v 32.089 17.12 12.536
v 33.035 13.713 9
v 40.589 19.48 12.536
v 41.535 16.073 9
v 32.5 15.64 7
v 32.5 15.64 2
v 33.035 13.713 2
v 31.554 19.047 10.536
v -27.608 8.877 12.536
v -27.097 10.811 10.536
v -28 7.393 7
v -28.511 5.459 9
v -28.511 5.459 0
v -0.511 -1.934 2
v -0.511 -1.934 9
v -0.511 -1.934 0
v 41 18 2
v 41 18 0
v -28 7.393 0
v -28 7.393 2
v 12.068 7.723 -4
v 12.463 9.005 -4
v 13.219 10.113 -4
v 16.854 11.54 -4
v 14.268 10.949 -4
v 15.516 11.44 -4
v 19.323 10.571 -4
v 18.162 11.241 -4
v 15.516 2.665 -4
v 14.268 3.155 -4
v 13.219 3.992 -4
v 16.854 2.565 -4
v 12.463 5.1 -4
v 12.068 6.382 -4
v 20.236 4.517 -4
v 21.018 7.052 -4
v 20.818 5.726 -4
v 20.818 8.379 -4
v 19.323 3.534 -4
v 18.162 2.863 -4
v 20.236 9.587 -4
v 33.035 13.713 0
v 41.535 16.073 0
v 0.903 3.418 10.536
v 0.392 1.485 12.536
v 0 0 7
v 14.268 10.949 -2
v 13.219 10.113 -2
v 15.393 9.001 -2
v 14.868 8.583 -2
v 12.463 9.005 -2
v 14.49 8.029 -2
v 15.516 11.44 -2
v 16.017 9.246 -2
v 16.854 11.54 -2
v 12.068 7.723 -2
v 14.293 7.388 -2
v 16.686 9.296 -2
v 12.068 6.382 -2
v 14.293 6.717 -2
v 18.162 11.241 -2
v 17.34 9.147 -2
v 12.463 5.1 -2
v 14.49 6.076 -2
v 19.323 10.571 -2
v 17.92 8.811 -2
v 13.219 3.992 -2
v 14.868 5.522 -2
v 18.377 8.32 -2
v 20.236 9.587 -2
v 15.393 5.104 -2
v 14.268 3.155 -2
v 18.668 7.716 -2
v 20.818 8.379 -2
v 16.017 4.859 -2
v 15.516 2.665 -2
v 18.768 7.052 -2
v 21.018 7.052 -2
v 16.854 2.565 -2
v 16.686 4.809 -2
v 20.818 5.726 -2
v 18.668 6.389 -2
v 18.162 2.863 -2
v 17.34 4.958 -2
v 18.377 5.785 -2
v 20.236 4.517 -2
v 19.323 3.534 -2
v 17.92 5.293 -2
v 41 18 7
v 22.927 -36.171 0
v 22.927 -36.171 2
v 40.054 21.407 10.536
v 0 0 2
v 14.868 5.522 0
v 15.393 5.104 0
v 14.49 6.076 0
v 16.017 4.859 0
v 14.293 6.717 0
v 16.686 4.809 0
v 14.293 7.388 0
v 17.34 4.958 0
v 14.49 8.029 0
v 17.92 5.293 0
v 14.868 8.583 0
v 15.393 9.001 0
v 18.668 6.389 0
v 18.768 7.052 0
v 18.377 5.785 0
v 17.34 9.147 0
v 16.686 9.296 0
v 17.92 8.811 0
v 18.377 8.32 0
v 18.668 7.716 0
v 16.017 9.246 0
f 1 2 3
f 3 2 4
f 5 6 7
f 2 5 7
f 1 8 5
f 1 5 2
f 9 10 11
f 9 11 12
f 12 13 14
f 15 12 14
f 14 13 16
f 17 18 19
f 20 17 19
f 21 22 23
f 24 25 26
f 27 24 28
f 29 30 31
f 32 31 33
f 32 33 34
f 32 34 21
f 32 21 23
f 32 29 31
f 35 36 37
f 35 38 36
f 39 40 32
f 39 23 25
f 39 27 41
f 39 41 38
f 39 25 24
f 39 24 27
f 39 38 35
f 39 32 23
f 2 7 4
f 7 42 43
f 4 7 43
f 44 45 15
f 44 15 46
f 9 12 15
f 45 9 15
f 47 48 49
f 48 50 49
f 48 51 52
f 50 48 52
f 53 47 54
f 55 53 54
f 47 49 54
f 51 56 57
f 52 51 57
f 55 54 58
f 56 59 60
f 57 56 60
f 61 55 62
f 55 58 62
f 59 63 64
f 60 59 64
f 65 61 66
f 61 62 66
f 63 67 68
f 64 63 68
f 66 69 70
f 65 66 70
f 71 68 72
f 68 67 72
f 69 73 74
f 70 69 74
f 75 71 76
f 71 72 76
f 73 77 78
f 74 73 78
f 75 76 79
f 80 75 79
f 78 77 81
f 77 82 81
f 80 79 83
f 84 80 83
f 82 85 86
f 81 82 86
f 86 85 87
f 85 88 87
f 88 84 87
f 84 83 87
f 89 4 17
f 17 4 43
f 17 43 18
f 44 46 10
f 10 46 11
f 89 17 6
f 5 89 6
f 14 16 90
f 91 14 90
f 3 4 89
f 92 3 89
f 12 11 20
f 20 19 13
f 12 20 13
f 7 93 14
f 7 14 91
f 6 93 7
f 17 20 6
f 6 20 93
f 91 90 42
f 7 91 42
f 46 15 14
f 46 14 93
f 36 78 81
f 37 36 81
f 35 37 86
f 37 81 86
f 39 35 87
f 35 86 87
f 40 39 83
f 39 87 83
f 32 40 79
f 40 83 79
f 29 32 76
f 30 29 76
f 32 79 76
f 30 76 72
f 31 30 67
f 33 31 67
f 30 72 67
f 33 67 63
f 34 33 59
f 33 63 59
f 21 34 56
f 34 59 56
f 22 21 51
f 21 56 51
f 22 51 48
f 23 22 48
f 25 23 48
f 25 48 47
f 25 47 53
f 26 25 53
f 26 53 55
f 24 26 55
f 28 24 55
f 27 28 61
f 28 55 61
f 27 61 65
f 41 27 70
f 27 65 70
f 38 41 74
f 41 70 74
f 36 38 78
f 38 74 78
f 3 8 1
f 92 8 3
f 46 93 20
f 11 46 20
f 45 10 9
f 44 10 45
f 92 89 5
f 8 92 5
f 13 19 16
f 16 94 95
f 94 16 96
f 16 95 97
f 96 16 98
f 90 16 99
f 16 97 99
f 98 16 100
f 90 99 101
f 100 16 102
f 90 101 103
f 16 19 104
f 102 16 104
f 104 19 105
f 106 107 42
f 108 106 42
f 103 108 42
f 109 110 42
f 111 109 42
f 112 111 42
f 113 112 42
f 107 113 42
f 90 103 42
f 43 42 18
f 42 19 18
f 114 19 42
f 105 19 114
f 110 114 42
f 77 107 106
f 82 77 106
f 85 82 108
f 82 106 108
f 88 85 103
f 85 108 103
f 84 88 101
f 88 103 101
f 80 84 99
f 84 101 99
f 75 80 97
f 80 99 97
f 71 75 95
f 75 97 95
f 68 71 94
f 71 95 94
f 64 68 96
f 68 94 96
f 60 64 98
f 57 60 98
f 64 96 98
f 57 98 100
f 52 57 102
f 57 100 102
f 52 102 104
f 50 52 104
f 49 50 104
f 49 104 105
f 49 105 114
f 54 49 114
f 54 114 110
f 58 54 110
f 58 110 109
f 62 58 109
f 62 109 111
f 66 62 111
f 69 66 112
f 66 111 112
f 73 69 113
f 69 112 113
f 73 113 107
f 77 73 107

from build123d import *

# Parameters (mm, degrees)
F1_DEPTH  = 2
F3_DEPTH  = 7
F4_SIZE   = 1.99999
F6_DEPTH  = 5
F8_DEPTH  = 5
F9_R      = 2.25
F10_DEPTH = 2
F11_R     = 4.5
F12_DEPTH = 2


# Not quite as in the source:
# - a fillet or chamfer is up to 0.001 mm smaller than in the source, because OpenCascade refuses the exact size


with BuildPart() as f1:
    # F0 (on Top) → F1 (new body)
    with BuildSketch(Plane.XY):
        Polygon((-28.5105540231, 5.458955369), (-0.5105540231, -1.9337359151), (22.9272134602, -36.1708849669), (33.0351494605, 13.7129257786), (41.5351494605, 16.0733799656), (41, 18.000454187), (-28, 7.3926912842), align=None)
    extrude(amount=F1_DEPTH)

    # F2 (on face) → F3 (join)
    with BuildSketch(Plane.XY.offset(2)):
        Polygon((-28.5105540231, 5.458955369), (-0.5105540231, -1.9337359151), (0, 0), (-28, 7.3926912842), align=None)
        Polygon((32.5, 15.64), (33.0351494605, 13.7129257786), (41.5351494605, 16.0733799656), (41, 18.000454187), align=None)
    extrude(amount=F3_DEPTH)

    # F4 (size 2 in the source; OpenCascade refuses exactly that, so slightly less here)
    f4_edges = [f1.edges().sort_by_distance(p)[0] for p in [
        (-14, 3.696346, 9),
        (36.75, 16.820227, 9),
    ]]
    chamfer(f4_edges, length=F4_SIZE)

    # F5 (on face) → F6 (join)
    with BuildSketch(Plane(origin=(0.8934695404, 3.3840378515, 3.5), x_dir=(0.9835734968, -0.125470625, -0.129770176), z_dir=(0.1805081059, 0.6836788893, 0.7071067812))):
        Polygon((-1.4274719357, -7.6460659082), (-0.9083912318, -4.8656783052), (-29.3760147392, 0.4490461714), (-29.8950954431, -2.3313414316), align=None)
    extrude(amount=F6_DEPTH)

    # F7 (on face) → F8 (join)
    with BuildSketch(Plane(origin=(-1.7892109036, 6.442951854, 6.6867708388), x_dir=(0.9819378198, 0.1312802997, 0.1362483066), z_dir=(-0.1892039063, 0.6813236249, 0.7071067812))):
        Polygon((43.5762937763, 8.105378656), (34.9199411754, 6.4055834869), (35.4649344018, 3.6301587657), (44.1212870028, 5.3299539348), align=None)
    extrude(amount=F8_DEPTH)

    # F9 (on face) → F10 (join)
    with BuildSketch(Plane(origin=(0, 0, 0), x_dir=(1, 0, 0), z_dir=(0, 0, -1))):
        with Locations((16.5175747303, -7.0523503236)):
            Circle(F9_R)
    extrude(amount=F10_DEPTH)

    # F11 (on face) → F12 (join)
    with BuildSketch(Plane(origin=(0, 0, -2), x_dir=(1, 0, 0), z_dir=(0, 0, -1))):
        with Locations((16.5175747303, -7.0523503236)):
            Circle(F11_R)
    extrude(amount=F12_DEPTH)


solid = f1.part
